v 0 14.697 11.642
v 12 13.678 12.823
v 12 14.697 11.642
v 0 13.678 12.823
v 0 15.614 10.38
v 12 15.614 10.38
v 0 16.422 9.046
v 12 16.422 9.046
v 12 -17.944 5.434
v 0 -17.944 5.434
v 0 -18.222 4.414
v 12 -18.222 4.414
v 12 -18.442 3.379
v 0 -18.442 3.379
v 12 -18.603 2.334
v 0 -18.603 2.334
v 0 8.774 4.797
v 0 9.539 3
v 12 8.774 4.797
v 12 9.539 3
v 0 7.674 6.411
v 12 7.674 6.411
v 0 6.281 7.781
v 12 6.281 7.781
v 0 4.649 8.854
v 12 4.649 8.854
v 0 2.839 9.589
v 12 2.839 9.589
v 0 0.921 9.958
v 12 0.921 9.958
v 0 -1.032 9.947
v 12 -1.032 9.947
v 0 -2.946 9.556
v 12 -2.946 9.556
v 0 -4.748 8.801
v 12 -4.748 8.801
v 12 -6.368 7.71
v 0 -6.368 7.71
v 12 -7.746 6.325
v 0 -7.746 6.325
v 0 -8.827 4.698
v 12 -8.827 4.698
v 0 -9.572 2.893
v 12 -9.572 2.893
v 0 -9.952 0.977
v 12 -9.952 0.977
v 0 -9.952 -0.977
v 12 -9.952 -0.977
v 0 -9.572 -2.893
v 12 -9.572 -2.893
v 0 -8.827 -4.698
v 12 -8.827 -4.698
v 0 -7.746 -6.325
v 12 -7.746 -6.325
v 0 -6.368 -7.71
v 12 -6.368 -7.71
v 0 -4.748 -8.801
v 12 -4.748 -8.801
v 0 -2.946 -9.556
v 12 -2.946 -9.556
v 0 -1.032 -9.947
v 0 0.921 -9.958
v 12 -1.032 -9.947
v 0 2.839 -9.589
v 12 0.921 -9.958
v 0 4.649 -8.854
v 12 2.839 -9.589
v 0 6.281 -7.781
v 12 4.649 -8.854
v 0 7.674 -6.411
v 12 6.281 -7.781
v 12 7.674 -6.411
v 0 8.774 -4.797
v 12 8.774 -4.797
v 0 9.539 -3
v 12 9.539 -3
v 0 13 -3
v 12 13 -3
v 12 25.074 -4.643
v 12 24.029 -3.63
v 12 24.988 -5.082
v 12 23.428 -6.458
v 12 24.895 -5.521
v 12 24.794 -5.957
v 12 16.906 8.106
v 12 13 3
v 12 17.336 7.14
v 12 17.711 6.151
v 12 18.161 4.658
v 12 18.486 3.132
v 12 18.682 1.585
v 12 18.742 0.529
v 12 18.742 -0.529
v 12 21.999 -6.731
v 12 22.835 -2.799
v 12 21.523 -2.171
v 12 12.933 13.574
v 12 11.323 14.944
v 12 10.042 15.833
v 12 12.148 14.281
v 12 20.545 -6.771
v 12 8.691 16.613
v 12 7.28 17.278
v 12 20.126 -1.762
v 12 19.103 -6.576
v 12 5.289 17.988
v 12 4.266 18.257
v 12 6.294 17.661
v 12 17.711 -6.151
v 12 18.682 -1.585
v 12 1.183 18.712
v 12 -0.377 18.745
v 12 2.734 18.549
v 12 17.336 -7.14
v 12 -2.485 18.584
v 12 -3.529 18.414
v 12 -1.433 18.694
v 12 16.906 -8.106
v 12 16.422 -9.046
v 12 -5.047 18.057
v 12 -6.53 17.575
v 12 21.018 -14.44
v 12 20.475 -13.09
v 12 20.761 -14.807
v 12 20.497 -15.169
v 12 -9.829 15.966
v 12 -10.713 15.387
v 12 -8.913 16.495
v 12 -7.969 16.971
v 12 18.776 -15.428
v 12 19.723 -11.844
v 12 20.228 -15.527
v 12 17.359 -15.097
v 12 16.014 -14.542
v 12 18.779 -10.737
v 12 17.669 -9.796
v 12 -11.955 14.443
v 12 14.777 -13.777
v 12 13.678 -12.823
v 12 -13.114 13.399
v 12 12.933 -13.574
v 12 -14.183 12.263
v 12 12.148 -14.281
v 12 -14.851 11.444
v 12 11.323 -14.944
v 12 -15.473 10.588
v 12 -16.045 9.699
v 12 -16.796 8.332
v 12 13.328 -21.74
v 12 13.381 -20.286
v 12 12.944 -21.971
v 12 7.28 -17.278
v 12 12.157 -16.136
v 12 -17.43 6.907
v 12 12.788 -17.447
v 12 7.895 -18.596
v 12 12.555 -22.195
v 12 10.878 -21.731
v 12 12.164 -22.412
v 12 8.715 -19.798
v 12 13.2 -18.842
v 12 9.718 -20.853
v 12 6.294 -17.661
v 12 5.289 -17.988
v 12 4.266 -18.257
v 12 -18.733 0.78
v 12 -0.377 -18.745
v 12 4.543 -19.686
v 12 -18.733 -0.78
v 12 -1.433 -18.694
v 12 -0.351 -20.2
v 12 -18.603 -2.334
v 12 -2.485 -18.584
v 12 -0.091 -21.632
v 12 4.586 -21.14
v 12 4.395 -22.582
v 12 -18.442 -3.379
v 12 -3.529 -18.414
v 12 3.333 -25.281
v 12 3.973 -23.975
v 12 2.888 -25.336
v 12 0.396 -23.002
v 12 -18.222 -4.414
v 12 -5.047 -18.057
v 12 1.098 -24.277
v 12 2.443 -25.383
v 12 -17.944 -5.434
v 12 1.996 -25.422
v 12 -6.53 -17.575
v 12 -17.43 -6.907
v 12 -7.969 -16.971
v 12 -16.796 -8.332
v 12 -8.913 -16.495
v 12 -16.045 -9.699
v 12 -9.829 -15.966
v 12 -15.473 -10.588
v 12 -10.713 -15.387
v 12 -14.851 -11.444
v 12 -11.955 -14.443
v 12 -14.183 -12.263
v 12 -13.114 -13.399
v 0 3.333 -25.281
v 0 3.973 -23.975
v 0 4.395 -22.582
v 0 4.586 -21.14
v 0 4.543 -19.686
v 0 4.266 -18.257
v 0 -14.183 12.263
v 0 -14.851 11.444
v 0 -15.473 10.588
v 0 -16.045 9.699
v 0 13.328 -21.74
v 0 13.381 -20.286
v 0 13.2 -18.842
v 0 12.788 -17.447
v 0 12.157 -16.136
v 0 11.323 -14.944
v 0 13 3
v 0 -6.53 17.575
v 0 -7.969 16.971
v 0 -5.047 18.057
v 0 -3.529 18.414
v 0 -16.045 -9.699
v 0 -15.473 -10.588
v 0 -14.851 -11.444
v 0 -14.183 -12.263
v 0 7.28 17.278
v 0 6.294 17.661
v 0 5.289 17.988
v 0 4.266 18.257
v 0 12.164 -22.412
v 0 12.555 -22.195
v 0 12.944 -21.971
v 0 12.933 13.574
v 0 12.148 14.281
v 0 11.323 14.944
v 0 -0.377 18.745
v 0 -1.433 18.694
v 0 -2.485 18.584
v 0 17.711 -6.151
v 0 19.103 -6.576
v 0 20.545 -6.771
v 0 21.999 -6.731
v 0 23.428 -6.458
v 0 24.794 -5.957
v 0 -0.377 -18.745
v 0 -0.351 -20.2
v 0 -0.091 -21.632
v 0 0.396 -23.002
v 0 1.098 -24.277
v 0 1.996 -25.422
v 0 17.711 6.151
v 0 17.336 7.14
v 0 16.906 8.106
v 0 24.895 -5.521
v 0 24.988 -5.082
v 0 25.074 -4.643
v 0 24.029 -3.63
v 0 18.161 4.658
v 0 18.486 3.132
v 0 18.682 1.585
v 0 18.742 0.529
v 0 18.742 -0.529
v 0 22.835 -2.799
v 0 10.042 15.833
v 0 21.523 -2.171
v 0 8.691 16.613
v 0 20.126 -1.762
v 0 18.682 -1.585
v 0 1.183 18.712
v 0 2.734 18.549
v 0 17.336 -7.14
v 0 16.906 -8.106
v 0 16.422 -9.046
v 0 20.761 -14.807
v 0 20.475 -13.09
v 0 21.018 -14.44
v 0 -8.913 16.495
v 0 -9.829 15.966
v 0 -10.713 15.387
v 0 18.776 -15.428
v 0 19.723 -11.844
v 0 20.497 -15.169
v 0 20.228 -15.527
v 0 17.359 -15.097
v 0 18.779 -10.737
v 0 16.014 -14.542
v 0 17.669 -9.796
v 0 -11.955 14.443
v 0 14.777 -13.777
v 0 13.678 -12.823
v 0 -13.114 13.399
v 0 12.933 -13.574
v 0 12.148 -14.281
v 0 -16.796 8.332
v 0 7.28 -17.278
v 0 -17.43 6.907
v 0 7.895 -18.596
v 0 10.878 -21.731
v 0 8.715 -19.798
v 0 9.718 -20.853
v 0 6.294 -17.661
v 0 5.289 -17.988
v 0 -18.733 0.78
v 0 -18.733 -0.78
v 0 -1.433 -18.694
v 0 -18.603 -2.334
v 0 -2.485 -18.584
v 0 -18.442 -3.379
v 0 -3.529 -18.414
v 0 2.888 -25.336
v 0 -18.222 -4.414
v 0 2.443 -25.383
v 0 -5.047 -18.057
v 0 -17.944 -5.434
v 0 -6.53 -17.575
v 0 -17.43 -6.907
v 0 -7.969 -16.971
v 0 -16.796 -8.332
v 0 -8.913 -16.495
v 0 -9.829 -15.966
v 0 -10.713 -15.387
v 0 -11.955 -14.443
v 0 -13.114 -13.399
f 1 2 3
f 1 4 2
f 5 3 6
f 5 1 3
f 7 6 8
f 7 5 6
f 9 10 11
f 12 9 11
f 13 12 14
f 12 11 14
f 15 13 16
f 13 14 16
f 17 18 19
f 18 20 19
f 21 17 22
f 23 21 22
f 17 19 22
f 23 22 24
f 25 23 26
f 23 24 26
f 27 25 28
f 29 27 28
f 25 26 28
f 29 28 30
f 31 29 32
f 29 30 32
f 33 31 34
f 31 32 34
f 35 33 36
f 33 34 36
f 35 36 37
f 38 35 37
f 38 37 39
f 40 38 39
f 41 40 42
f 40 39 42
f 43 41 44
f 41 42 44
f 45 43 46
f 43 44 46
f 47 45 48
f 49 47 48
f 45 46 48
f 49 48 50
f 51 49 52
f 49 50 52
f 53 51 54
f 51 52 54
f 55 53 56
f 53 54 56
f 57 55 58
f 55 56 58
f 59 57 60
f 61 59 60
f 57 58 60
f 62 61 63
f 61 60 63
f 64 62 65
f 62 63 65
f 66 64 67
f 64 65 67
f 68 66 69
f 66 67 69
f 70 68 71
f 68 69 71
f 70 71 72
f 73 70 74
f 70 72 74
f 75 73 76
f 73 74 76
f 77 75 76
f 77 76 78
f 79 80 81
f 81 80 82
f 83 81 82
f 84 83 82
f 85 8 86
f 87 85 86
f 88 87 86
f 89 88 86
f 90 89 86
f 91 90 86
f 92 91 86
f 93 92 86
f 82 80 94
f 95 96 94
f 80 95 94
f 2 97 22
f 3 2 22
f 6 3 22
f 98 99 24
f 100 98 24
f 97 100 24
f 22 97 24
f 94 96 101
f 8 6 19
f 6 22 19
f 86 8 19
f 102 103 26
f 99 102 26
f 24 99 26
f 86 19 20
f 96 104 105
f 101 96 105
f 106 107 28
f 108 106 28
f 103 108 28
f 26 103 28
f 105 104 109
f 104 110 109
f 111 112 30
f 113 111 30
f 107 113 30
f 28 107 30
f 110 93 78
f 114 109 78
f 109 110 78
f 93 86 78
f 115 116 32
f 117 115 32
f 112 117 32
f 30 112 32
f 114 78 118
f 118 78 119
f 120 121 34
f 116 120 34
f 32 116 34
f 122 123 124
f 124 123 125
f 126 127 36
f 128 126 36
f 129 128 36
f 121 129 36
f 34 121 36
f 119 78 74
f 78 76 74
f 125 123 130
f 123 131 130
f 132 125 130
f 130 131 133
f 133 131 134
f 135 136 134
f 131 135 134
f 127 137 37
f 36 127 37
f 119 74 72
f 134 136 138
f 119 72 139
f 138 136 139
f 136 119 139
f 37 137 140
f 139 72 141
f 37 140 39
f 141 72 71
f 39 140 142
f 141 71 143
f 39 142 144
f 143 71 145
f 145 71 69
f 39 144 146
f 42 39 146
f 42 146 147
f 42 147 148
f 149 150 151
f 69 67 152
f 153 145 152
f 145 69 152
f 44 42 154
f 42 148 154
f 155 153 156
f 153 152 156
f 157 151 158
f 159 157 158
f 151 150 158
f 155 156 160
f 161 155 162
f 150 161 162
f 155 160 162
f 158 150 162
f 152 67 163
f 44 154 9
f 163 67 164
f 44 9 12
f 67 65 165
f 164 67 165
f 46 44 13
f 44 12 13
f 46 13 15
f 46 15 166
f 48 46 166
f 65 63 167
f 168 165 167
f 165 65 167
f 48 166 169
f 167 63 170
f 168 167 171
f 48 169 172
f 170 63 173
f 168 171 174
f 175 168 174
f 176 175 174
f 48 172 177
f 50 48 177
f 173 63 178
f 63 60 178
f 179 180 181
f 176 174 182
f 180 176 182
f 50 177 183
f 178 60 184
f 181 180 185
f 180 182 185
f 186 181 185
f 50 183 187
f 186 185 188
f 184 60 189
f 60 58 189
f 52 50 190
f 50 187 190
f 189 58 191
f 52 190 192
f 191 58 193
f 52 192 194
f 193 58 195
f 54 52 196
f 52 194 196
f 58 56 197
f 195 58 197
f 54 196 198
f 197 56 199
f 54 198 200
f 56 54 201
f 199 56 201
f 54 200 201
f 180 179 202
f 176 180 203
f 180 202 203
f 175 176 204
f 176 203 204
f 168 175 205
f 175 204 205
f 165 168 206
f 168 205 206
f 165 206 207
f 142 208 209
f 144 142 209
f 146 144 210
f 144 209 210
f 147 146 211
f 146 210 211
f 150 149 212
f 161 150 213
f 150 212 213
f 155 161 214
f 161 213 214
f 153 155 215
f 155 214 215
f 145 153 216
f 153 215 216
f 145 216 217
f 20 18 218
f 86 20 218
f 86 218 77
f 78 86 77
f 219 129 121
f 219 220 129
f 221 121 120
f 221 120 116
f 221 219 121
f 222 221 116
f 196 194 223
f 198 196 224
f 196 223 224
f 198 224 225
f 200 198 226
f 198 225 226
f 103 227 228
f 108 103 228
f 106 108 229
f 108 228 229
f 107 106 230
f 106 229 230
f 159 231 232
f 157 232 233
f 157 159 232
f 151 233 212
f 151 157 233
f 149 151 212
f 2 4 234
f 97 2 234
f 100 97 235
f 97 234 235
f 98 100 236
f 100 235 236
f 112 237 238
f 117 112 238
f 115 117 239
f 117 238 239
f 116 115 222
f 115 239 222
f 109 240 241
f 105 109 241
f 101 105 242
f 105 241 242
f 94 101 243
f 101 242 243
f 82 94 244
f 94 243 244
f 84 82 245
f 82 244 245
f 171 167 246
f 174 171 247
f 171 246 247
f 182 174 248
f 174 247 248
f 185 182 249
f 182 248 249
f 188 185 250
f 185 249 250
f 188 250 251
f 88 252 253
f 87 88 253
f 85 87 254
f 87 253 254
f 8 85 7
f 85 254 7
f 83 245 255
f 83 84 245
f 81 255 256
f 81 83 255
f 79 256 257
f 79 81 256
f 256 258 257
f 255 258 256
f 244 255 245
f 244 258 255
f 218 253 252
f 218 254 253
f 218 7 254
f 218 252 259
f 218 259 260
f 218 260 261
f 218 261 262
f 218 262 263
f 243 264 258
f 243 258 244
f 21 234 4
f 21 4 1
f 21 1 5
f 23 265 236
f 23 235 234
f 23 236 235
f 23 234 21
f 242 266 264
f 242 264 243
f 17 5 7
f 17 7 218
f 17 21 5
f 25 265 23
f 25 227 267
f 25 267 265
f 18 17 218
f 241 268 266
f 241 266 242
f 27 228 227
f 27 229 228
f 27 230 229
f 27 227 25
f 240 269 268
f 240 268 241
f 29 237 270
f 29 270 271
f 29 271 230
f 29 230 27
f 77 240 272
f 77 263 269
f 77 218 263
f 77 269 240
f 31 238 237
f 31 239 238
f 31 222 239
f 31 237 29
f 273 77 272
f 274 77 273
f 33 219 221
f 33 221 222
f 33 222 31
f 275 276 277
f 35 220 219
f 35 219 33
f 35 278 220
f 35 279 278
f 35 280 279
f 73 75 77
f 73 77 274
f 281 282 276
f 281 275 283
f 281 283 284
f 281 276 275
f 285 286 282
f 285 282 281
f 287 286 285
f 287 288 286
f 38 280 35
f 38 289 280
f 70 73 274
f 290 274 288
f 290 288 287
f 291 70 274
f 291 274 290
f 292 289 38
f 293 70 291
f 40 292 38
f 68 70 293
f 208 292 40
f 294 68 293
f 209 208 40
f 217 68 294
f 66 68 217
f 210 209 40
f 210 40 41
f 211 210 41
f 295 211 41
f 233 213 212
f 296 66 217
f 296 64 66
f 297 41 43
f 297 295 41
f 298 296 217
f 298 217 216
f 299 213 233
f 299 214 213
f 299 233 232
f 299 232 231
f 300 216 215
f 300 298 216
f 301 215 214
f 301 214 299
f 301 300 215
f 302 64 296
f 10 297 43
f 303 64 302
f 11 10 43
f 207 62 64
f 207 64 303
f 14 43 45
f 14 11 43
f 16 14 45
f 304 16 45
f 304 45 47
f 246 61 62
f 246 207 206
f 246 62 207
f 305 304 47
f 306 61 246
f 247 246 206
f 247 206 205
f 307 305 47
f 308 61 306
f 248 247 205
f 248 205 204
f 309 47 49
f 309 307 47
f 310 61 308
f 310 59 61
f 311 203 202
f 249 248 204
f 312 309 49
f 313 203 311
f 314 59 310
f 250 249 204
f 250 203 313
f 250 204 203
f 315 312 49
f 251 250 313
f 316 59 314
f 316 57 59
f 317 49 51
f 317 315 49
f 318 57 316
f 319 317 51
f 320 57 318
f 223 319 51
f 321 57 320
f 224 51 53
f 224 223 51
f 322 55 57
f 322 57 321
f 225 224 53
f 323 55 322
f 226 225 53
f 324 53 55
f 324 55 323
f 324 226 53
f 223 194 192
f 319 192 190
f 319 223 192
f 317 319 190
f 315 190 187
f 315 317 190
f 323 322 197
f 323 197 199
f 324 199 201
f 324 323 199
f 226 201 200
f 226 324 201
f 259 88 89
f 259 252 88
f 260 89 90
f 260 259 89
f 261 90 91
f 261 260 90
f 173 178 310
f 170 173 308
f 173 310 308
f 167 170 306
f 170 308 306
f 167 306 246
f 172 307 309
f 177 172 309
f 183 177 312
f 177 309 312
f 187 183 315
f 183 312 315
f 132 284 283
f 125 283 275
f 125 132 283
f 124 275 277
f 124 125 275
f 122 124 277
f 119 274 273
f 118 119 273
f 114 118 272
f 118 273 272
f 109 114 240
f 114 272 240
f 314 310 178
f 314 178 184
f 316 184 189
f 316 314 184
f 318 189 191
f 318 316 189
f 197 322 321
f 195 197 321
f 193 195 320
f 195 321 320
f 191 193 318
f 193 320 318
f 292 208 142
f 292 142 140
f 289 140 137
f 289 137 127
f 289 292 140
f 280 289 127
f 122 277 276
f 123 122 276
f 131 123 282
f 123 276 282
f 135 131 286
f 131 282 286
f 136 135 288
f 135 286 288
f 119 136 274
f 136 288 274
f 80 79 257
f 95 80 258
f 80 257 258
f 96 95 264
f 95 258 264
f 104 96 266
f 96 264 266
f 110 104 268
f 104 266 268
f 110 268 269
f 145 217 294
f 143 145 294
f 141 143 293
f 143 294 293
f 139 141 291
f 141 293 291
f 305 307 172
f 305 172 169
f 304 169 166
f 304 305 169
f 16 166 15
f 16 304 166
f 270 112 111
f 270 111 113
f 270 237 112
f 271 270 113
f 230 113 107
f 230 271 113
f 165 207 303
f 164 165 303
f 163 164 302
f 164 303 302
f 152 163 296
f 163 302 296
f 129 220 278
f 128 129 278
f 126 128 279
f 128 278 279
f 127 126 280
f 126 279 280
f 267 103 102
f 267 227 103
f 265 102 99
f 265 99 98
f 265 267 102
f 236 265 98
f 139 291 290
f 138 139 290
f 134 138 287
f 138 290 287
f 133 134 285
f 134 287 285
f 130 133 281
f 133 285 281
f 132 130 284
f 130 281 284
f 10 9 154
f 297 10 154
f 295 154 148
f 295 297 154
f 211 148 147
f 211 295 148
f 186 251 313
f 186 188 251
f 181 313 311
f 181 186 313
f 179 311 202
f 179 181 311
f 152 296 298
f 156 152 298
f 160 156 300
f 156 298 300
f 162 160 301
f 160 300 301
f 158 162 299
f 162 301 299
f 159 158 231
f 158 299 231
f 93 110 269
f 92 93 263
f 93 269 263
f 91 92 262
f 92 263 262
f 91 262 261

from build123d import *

# Parameters (mm, degrees)
BASPROSKE_W             = 12
BASPROSKE_H             = 25.5
TOOTHCUT_DEPTH          = 39.006578378
TEETHCUTS_COUNT         = 15
TEETHCUTS_ANGLE         = 336
BORSKE_R                = 10
BORE_DEPTH              = 50.0000508
CUT_EXTRUDE1_DEPTH      = 38.954121274
CUT_EXTRUDE2_DEPTH      = 38.669115521
CUT_EXTRUDE2_DEPTH_BACK = 38.669115521
SKETCH3_W               = 6
SKETCH3_H               = 6


with BuildPart() as part:
    # BasProSke → Base-Revolve (revolve)
    with BuildSketch(Plane(origin=(0, 0, 0), x_dir=(1, 0, 0), z_dir=(0, 1, 0)), mode=Mode.PRIVATE) as base_revolve_sk:
        with Locations((6, 12.75)):
            Rectangle(BASPROSKE_W, BASPROSKE_H)
    revolve(base_revolve_sk.sketch.rotate(Axis((-10, 0, 0), (1, 0, 0)), 180), axis=Axis((-10, 0, 0), (1, 0, 0)))

    # TooCutSke → ToothCut (cut, through all)
    with BuildSketch(Plane(origin=(0, 0, 0), x_dir=(0, 0, -1), z_dir=(1, 0, 0))):
        with BuildLine():
            ThreePointArc((1.584594428, 18.681918036), (0, 18.749), (-1.584594428, 18.681918036))
            ThreePointArc((-1.584594428, 18.681918036), (-2.465052499, 22.206073835), (-4.666912141, 25.095138498))
            ThreePointArc((-4.666912141, 25.095138498), (0, 25.5254), (4.666912141, 25.095138498))
            ThreePointArc((4.666912141, 25.095138498), (2.465052499, 22.206073835), (1.584594428, 18.681918036))
        make_face()
    toothcut = extrude(amount=TOOTHCUT_DEPTH, mode=Mode.SUBTRACT)

    # TeethCuts: ToothCut ×15 about axis
    teethcuts_axis = Axis((-10, 0, 0), (1, 0, 0))
    for i in range(1, TEETHCUTS_COUNT):
        add(toothcut.rotate(teethcuts_axis, i * TEETHCUTS_ANGLE / (TEETHCUTS_COUNT - 1)), mode=Mode.SUBTRACT)

    # BorSke → Bore (cut, symmetric)
    with BuildSketch(Plane(origin=(0, 0, 0), x_dir=(0, 0, -1), z_dir=(1, 0, 0))):
        with Locations(Location((0, 0, 0), (0, 0, 180))):
            Circle(BORSKE_R)
    extrude(amount=BORE_DEPTH, both=True, mode=Mode.SUBTRACT)

    # Sketch1 → Cut-Extrude1 (cut, through all)
    with BuildSketch(Plane(origin=(0, 0, 0), x_dir=(0, 0, -1), z_dir=(1, 0, 0))):
        with BuildLine():
            ThreePointArc((18.677788491, -1.632549567), (-13.822692806, -12.667208239), (0, 18.749))
            Line((0, 18.749), (0, 29.219389367))
            Line((0, 29.219389367), (-29.845264735, 29.219389367))
            Line((-29.845264735, 29.219389367), (-29.845264735, -32.484488502))
            Line((-29.845264735, -32.484488502), (30.166423099, -32.484488502))
            Line((30.166423099, -32.484488502), (30.166423099, -1.632549567))
            Line((30.166423099, -1.632549567), (18.677788491, -1.632549567))
        make_face()
    extrude(amount=CUT_EXTRUDE1_DEPTH, mode=Mode.SUBTRACT)

    # Sketch3 → Cut-Extrude2 (cut, two sides: drawn at the far end of the back side and taken through both)
    with BuildSketch(Plane(origin=(0, 0, 0), x_dir=(0, 0, -1), z_dir=(1, 0, 0)).offset(-CUT_EXTRUDE2_DEPTH_BACK)):
        with Locations((0, 10)):
            Rectangle(SKETCH3_W, SKETCH3_H)
    extrude(amount=CUT_EXTRUDE2_DEPTH + CUT_EXTRUDE2_DEPTH_BACK, mode=Mode.SUBTRACT)


solid = part.part
